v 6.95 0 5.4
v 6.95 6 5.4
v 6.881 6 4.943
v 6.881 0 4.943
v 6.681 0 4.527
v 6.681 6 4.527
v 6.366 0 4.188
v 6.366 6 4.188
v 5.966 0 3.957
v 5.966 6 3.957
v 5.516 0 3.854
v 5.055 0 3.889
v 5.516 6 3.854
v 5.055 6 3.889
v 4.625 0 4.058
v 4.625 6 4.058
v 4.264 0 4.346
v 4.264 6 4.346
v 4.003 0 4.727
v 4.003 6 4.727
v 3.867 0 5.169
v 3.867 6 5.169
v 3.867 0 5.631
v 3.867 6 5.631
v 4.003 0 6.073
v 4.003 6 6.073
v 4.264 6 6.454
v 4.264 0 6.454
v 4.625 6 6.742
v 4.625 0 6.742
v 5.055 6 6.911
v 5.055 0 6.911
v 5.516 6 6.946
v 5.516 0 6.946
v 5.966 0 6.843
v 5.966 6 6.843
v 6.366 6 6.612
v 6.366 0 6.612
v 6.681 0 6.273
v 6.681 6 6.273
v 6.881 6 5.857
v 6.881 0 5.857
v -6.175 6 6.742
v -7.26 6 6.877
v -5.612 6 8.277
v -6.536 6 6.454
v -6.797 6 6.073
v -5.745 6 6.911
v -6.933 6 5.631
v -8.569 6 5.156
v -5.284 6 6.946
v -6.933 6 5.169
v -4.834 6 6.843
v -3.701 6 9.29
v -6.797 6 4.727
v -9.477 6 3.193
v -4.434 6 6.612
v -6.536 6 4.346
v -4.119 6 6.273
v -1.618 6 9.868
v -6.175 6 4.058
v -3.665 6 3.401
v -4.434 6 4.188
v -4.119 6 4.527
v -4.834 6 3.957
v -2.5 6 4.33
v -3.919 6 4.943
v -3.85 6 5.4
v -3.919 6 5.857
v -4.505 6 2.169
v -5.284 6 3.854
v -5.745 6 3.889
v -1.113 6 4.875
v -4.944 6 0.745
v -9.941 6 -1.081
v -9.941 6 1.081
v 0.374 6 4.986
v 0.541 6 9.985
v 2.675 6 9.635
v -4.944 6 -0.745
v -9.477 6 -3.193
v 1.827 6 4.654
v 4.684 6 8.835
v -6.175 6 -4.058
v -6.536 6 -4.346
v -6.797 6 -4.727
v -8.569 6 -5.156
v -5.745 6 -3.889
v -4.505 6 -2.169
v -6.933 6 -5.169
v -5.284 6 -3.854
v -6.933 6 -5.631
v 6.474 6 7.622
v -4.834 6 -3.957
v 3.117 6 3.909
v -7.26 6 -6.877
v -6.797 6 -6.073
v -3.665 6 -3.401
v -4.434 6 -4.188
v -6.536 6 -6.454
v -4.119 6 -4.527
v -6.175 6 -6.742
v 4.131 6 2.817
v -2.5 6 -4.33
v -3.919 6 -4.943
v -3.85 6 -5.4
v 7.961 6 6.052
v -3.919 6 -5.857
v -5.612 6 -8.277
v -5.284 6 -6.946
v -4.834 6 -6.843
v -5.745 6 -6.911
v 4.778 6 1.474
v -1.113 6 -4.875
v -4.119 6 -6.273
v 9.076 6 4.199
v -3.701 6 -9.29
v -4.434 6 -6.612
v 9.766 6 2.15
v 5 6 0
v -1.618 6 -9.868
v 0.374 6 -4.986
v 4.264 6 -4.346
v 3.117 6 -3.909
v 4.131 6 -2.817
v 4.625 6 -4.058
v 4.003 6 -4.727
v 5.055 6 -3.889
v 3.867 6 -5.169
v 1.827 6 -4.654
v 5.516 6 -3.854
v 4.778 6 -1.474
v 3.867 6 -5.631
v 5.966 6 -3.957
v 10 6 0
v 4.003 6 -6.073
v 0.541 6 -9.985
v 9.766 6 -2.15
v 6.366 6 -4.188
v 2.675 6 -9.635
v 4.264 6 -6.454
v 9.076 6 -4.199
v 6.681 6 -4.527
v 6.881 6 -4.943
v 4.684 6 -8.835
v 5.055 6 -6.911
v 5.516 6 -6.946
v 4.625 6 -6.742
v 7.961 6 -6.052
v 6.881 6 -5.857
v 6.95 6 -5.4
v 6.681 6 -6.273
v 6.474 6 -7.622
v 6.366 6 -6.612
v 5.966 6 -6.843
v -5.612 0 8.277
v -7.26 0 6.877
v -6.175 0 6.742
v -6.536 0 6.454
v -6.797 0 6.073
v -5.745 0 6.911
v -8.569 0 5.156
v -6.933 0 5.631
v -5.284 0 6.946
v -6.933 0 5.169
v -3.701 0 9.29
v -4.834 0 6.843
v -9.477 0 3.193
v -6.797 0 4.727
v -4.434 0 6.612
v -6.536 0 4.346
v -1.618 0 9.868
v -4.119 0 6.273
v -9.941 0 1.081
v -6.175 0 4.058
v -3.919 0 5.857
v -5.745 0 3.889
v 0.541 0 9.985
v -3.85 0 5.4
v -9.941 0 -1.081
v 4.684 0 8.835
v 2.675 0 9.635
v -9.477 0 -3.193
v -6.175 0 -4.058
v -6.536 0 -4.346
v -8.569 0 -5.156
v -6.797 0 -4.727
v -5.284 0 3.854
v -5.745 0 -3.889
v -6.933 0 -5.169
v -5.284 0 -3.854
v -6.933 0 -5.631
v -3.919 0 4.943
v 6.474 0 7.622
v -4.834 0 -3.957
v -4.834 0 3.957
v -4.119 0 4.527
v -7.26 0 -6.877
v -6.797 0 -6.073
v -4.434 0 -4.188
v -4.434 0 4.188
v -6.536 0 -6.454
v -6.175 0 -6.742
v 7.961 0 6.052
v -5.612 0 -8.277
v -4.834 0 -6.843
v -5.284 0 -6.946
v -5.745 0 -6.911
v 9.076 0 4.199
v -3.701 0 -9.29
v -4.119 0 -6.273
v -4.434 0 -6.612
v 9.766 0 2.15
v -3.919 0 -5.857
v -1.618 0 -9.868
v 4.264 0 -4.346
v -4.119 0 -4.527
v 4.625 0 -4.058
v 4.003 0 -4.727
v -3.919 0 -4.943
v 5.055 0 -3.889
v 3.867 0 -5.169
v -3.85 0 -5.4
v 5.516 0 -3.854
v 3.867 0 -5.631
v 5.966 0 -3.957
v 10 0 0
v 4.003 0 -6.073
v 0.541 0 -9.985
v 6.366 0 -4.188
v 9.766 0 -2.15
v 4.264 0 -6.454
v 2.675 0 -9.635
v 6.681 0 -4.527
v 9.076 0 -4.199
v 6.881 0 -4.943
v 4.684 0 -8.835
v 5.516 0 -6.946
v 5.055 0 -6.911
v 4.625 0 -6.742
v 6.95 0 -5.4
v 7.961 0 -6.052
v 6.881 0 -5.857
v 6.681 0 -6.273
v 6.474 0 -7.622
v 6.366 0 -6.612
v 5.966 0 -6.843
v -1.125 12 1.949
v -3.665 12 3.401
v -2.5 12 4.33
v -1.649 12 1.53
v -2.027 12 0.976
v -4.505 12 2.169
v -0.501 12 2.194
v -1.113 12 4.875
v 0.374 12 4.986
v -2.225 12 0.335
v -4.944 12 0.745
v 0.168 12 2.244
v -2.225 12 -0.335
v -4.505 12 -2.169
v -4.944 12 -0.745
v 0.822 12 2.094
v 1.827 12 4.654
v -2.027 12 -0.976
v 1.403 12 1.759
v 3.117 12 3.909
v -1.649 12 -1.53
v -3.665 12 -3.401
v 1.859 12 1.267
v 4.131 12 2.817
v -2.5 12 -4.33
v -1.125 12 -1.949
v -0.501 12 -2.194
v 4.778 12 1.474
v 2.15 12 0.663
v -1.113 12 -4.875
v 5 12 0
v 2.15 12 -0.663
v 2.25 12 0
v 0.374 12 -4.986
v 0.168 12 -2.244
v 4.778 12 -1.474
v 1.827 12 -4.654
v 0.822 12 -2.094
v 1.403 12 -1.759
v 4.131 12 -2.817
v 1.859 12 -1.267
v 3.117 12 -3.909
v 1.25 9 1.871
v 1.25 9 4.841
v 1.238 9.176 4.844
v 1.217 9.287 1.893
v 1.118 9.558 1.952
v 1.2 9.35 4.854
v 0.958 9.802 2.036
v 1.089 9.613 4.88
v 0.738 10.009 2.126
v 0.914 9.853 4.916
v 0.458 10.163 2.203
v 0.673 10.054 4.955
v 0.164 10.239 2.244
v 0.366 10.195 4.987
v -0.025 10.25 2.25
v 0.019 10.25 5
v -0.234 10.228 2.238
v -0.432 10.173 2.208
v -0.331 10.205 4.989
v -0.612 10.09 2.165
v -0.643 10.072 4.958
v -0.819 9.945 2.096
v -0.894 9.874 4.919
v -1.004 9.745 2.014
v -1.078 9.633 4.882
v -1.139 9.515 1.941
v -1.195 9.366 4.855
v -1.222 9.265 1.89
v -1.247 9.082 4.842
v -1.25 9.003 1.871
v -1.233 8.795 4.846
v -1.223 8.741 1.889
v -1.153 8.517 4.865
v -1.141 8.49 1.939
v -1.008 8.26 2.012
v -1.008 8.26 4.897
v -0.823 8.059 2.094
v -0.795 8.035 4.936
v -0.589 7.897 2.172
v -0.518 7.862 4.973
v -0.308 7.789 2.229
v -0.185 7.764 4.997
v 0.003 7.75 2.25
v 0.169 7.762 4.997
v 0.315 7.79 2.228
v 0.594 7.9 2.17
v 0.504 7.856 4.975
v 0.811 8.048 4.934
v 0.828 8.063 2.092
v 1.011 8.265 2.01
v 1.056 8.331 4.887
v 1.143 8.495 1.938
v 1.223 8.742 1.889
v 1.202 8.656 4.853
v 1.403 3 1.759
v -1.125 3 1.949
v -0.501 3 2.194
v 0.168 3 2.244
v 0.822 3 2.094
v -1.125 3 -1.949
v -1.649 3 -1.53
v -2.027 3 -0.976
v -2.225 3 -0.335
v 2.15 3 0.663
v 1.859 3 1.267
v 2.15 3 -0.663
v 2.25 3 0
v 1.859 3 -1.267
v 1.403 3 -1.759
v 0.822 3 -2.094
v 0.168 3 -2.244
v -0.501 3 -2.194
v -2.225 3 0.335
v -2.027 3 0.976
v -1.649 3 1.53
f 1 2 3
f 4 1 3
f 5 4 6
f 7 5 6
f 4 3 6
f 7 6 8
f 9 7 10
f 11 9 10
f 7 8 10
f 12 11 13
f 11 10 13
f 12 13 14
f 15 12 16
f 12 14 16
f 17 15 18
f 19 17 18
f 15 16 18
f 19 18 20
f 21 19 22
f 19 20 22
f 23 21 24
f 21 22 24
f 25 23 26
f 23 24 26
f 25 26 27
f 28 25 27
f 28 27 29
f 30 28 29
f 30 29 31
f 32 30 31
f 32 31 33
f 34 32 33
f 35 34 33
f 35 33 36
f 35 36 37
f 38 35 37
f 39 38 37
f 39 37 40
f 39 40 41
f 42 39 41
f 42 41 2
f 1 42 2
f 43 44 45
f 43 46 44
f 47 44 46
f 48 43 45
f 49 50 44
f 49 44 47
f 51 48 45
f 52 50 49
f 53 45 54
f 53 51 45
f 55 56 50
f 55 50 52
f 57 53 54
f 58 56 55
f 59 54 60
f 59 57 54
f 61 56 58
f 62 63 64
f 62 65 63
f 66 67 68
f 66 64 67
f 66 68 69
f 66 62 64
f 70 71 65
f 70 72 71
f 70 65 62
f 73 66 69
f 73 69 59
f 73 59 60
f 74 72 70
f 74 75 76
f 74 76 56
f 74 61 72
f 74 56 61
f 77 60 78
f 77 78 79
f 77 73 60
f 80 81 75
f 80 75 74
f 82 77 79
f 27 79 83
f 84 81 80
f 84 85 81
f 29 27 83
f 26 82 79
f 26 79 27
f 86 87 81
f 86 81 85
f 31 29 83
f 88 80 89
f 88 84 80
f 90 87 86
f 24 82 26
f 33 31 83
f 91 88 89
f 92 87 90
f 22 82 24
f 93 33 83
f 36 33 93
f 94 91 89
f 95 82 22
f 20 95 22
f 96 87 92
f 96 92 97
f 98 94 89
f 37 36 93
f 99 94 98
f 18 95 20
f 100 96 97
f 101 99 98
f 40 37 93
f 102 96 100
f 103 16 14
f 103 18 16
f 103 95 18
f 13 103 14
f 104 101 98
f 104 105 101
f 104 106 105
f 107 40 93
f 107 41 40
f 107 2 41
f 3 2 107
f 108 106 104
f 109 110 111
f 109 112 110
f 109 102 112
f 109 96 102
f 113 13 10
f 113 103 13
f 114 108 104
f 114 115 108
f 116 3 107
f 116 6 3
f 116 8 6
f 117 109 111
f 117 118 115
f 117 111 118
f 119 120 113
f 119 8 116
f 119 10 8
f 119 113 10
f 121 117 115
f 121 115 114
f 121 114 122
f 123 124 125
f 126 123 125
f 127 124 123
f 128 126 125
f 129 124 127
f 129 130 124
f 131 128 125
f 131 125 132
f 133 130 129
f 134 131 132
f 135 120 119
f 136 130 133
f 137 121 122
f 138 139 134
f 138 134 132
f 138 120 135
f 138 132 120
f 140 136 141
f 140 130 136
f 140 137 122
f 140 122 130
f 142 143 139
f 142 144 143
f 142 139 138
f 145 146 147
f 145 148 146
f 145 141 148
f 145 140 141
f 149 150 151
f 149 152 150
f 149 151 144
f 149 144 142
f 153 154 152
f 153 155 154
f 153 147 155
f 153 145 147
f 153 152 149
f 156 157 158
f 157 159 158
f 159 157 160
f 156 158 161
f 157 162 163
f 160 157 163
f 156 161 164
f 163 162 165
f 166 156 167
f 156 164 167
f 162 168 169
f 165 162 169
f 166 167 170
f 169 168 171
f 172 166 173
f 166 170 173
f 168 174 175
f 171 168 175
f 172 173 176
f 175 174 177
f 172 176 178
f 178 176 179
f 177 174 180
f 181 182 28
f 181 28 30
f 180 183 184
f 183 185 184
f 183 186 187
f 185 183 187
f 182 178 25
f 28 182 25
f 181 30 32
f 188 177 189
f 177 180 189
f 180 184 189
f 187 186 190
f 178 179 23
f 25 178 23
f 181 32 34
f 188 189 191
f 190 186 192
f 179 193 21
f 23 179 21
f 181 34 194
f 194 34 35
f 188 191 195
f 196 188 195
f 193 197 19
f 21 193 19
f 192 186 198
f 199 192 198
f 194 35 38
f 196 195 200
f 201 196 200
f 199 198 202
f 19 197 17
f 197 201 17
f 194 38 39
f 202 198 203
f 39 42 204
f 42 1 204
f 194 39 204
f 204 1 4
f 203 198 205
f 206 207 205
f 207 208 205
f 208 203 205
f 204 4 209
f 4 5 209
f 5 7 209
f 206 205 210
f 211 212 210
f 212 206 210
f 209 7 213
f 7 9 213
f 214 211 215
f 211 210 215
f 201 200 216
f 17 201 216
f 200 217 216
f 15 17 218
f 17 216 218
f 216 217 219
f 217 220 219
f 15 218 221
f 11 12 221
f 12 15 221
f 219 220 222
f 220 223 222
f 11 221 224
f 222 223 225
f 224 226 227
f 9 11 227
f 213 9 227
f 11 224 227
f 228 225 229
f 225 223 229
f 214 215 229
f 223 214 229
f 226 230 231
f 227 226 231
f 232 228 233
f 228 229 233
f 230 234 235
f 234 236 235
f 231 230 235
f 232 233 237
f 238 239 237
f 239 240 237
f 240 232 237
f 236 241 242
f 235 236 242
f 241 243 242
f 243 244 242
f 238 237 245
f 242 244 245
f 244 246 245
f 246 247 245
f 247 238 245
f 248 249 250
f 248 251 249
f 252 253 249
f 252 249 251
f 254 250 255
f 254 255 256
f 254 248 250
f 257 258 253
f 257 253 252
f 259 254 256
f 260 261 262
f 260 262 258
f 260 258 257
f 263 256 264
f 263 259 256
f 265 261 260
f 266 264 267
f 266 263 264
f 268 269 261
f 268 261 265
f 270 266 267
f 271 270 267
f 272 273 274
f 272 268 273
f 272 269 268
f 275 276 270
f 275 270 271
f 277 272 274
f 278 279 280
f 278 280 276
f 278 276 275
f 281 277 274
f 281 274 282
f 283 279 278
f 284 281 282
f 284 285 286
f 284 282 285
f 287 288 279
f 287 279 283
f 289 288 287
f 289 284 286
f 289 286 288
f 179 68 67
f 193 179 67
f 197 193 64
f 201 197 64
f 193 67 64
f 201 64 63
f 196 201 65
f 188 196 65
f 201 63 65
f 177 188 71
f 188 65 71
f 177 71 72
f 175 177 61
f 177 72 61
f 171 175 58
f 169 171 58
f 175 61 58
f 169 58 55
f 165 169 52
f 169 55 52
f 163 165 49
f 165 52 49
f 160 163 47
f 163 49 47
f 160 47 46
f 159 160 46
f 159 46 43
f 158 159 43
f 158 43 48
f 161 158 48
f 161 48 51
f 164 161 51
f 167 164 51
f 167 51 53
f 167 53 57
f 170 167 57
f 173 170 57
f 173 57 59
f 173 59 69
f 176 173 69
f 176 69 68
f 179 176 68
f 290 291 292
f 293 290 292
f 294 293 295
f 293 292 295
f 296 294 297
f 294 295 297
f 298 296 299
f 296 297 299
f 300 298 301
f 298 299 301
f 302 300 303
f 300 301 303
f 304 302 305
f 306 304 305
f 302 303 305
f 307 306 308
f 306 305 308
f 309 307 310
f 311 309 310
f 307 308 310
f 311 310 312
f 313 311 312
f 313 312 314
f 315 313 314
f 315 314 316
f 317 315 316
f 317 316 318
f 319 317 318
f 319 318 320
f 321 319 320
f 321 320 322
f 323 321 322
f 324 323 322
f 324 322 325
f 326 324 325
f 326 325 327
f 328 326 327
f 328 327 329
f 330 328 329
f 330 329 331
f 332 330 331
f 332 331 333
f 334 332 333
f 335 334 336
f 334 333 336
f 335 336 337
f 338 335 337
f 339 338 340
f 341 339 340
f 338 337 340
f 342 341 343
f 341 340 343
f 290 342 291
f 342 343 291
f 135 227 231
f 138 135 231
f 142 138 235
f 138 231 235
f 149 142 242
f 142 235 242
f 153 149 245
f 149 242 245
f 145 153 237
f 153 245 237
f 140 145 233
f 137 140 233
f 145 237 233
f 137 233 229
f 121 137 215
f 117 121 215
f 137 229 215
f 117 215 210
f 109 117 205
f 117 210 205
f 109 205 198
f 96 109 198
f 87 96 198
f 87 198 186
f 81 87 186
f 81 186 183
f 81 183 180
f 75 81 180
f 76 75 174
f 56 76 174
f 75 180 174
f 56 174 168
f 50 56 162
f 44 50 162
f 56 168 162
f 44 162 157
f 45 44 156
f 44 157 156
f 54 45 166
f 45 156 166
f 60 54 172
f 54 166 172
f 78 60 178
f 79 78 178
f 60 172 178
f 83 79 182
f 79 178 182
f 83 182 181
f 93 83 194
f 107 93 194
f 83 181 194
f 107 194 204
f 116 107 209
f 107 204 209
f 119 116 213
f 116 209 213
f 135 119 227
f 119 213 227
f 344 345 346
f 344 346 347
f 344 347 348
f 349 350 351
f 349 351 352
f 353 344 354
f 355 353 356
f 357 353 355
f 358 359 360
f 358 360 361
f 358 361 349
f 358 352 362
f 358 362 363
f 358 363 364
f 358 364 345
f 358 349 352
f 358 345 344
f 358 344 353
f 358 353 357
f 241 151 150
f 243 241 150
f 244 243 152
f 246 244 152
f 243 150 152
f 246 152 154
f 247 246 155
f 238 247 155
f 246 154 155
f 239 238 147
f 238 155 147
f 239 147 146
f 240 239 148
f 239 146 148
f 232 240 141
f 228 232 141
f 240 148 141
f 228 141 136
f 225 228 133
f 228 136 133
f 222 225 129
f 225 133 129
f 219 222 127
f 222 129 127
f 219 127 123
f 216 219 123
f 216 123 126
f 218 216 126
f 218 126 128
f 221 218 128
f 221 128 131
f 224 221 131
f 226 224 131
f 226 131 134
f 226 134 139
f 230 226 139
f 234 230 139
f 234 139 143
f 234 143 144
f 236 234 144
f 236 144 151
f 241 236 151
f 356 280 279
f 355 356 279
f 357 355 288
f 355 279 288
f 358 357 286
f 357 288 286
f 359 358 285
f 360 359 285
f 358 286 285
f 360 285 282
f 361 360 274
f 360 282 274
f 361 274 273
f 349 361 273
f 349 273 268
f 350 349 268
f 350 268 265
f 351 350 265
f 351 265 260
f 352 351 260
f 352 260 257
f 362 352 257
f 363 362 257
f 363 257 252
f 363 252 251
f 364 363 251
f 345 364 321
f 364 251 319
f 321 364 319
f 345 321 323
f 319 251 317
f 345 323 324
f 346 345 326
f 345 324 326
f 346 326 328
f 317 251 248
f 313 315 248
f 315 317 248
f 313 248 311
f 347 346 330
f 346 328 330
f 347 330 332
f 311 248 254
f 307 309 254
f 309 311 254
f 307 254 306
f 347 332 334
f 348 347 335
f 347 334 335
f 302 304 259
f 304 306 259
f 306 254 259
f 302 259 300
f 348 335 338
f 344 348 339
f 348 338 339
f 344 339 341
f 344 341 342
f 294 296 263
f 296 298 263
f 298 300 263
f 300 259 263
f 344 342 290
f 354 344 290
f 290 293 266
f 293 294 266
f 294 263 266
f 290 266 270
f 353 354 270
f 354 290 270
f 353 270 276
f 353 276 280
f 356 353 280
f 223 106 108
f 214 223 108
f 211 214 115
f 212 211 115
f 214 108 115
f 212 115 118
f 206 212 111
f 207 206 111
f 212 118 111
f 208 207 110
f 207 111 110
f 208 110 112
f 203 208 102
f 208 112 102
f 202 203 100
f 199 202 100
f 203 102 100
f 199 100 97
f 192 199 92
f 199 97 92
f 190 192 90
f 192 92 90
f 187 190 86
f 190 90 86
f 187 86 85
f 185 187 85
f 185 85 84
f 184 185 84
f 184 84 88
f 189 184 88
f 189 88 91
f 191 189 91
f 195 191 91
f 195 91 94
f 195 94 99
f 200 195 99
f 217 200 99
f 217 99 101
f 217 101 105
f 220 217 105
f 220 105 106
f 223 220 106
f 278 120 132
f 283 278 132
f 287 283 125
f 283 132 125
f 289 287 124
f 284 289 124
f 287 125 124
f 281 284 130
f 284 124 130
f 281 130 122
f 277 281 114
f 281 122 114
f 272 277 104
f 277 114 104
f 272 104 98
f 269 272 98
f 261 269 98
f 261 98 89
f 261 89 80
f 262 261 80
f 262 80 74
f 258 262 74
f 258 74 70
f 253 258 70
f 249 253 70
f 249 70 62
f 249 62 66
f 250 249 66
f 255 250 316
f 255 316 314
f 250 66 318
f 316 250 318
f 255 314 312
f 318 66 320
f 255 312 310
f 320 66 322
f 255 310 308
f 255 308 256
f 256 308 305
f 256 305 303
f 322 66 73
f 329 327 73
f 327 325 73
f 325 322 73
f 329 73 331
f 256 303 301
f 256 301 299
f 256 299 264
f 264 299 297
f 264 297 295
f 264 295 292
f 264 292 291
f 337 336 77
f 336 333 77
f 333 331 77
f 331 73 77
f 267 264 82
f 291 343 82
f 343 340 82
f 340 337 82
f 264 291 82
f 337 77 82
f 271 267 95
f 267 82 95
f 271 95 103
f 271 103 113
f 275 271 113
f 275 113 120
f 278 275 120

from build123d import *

# Parameters (mm, degrees)
SKIZZE1_R                       = 10
AUFSATZ_LINEAR_AUSTRAGEN1_DEPTH = 6
SKIZZE2_R                       = 5
AUFSATZ_LINEAR_AUSTRAGEN2_DEPTH = 6
SKIZZE3_R                       = 2.25
SCHNITT_LINEAR_AUSTRAGEN1_DEPTH = 9
SKIZZE4_R                       = 1.55
SCHNITT_LINEAR_AUSTRAGEN2_DEPTH = 7
SCHNITT_LINEAR_AUSTRAGEN3_REACH = 17
SKIZZE5_R                       = 1.25


with BuildPart() as part:
    # Skizze1 → Aufsatz-Linear austragen1 (new body)
    with BuildSketch(Plane(origin=(0, 0, 0), x_dir=(1, 0, 0), z_dir=(0, 1, 0))):
        Circle(SKIZZE1_R)
    extrude(amount=AUFSATZ_LINEAR_AUSTRAGEN1_DEPTH)

    # Skizze2 → Aufsatz-Linear austragen2 (add)
    with BuildSketch(Plane(origin=(0, 6, 0), x_dir=(1, 0, 0), z_dir=(0, 1, 0))):
        Circle(SKIZZE2_R)
    extrude(amount=AUFSATZ_LINEAR_AUSTRAGEN2_DEPTH)

    # Skizze3 → Schnitt-Linear austragen1 (cut)
    with BuildSketch(Plane(origin=(0, 12, 0), x_dir=(1, 0, 0), z_dir=(0, 1, 0))):
        Circle(SKIZZE3_R)
    extrude(amount=-SCHNITT_LINEAR_AUSTRAGEN1_DEPTH, mode=Mode.SUBTRACT)

    # Skizze4 → Schnitt-Linear austragen2 (cut, through all)
    with BuildSketch(Plane(origin=(0, 6, 0), x_dir=(1, 0, 0), z_dir=(0, 1, 0))):
        with Locations((-5.4, 5.4)):
            Circle(SKIZZE4_R)
        with Locations((5.4, 5.4)):
            Circle(SKIZZE4_R)
        with Locations((5.4, -5.4)):
            Circle(SKIZZE4_R)
        with Locations((-5.4, -5.4)):
            Circle(SKIZZE4_R)
    extrude(amount=-SCHNITT_LINEAR_AUSTRAGEN2_DEPTH, mode=Mode.SUBTRACT)

    # Skizze5 → Schnitt-Linear austragen3 (cut, up to next)
    with BuildSketch(Plane.XY.offset(5), mode=Mode.PRIVATE) as schnitt_linear_austragen3_sk1:
        with Locations((0, 9)):
            Circle(SKIZZE5_R)
    schnitt_linear_austragen3_tool1 = extrude(schnitt_linear_austragen3_sk1.sketch, amount=-SCHNITT_LINEAR_AUSTRAGEN3_REACH, mode=Mode.PRIVATE) & part.part
    add(schnitt_linear_austragen3_tool1.solids().sort_by_distance((0, 9, 5))[0], mode=Mode.SUBTRACT)


solid = part.part
